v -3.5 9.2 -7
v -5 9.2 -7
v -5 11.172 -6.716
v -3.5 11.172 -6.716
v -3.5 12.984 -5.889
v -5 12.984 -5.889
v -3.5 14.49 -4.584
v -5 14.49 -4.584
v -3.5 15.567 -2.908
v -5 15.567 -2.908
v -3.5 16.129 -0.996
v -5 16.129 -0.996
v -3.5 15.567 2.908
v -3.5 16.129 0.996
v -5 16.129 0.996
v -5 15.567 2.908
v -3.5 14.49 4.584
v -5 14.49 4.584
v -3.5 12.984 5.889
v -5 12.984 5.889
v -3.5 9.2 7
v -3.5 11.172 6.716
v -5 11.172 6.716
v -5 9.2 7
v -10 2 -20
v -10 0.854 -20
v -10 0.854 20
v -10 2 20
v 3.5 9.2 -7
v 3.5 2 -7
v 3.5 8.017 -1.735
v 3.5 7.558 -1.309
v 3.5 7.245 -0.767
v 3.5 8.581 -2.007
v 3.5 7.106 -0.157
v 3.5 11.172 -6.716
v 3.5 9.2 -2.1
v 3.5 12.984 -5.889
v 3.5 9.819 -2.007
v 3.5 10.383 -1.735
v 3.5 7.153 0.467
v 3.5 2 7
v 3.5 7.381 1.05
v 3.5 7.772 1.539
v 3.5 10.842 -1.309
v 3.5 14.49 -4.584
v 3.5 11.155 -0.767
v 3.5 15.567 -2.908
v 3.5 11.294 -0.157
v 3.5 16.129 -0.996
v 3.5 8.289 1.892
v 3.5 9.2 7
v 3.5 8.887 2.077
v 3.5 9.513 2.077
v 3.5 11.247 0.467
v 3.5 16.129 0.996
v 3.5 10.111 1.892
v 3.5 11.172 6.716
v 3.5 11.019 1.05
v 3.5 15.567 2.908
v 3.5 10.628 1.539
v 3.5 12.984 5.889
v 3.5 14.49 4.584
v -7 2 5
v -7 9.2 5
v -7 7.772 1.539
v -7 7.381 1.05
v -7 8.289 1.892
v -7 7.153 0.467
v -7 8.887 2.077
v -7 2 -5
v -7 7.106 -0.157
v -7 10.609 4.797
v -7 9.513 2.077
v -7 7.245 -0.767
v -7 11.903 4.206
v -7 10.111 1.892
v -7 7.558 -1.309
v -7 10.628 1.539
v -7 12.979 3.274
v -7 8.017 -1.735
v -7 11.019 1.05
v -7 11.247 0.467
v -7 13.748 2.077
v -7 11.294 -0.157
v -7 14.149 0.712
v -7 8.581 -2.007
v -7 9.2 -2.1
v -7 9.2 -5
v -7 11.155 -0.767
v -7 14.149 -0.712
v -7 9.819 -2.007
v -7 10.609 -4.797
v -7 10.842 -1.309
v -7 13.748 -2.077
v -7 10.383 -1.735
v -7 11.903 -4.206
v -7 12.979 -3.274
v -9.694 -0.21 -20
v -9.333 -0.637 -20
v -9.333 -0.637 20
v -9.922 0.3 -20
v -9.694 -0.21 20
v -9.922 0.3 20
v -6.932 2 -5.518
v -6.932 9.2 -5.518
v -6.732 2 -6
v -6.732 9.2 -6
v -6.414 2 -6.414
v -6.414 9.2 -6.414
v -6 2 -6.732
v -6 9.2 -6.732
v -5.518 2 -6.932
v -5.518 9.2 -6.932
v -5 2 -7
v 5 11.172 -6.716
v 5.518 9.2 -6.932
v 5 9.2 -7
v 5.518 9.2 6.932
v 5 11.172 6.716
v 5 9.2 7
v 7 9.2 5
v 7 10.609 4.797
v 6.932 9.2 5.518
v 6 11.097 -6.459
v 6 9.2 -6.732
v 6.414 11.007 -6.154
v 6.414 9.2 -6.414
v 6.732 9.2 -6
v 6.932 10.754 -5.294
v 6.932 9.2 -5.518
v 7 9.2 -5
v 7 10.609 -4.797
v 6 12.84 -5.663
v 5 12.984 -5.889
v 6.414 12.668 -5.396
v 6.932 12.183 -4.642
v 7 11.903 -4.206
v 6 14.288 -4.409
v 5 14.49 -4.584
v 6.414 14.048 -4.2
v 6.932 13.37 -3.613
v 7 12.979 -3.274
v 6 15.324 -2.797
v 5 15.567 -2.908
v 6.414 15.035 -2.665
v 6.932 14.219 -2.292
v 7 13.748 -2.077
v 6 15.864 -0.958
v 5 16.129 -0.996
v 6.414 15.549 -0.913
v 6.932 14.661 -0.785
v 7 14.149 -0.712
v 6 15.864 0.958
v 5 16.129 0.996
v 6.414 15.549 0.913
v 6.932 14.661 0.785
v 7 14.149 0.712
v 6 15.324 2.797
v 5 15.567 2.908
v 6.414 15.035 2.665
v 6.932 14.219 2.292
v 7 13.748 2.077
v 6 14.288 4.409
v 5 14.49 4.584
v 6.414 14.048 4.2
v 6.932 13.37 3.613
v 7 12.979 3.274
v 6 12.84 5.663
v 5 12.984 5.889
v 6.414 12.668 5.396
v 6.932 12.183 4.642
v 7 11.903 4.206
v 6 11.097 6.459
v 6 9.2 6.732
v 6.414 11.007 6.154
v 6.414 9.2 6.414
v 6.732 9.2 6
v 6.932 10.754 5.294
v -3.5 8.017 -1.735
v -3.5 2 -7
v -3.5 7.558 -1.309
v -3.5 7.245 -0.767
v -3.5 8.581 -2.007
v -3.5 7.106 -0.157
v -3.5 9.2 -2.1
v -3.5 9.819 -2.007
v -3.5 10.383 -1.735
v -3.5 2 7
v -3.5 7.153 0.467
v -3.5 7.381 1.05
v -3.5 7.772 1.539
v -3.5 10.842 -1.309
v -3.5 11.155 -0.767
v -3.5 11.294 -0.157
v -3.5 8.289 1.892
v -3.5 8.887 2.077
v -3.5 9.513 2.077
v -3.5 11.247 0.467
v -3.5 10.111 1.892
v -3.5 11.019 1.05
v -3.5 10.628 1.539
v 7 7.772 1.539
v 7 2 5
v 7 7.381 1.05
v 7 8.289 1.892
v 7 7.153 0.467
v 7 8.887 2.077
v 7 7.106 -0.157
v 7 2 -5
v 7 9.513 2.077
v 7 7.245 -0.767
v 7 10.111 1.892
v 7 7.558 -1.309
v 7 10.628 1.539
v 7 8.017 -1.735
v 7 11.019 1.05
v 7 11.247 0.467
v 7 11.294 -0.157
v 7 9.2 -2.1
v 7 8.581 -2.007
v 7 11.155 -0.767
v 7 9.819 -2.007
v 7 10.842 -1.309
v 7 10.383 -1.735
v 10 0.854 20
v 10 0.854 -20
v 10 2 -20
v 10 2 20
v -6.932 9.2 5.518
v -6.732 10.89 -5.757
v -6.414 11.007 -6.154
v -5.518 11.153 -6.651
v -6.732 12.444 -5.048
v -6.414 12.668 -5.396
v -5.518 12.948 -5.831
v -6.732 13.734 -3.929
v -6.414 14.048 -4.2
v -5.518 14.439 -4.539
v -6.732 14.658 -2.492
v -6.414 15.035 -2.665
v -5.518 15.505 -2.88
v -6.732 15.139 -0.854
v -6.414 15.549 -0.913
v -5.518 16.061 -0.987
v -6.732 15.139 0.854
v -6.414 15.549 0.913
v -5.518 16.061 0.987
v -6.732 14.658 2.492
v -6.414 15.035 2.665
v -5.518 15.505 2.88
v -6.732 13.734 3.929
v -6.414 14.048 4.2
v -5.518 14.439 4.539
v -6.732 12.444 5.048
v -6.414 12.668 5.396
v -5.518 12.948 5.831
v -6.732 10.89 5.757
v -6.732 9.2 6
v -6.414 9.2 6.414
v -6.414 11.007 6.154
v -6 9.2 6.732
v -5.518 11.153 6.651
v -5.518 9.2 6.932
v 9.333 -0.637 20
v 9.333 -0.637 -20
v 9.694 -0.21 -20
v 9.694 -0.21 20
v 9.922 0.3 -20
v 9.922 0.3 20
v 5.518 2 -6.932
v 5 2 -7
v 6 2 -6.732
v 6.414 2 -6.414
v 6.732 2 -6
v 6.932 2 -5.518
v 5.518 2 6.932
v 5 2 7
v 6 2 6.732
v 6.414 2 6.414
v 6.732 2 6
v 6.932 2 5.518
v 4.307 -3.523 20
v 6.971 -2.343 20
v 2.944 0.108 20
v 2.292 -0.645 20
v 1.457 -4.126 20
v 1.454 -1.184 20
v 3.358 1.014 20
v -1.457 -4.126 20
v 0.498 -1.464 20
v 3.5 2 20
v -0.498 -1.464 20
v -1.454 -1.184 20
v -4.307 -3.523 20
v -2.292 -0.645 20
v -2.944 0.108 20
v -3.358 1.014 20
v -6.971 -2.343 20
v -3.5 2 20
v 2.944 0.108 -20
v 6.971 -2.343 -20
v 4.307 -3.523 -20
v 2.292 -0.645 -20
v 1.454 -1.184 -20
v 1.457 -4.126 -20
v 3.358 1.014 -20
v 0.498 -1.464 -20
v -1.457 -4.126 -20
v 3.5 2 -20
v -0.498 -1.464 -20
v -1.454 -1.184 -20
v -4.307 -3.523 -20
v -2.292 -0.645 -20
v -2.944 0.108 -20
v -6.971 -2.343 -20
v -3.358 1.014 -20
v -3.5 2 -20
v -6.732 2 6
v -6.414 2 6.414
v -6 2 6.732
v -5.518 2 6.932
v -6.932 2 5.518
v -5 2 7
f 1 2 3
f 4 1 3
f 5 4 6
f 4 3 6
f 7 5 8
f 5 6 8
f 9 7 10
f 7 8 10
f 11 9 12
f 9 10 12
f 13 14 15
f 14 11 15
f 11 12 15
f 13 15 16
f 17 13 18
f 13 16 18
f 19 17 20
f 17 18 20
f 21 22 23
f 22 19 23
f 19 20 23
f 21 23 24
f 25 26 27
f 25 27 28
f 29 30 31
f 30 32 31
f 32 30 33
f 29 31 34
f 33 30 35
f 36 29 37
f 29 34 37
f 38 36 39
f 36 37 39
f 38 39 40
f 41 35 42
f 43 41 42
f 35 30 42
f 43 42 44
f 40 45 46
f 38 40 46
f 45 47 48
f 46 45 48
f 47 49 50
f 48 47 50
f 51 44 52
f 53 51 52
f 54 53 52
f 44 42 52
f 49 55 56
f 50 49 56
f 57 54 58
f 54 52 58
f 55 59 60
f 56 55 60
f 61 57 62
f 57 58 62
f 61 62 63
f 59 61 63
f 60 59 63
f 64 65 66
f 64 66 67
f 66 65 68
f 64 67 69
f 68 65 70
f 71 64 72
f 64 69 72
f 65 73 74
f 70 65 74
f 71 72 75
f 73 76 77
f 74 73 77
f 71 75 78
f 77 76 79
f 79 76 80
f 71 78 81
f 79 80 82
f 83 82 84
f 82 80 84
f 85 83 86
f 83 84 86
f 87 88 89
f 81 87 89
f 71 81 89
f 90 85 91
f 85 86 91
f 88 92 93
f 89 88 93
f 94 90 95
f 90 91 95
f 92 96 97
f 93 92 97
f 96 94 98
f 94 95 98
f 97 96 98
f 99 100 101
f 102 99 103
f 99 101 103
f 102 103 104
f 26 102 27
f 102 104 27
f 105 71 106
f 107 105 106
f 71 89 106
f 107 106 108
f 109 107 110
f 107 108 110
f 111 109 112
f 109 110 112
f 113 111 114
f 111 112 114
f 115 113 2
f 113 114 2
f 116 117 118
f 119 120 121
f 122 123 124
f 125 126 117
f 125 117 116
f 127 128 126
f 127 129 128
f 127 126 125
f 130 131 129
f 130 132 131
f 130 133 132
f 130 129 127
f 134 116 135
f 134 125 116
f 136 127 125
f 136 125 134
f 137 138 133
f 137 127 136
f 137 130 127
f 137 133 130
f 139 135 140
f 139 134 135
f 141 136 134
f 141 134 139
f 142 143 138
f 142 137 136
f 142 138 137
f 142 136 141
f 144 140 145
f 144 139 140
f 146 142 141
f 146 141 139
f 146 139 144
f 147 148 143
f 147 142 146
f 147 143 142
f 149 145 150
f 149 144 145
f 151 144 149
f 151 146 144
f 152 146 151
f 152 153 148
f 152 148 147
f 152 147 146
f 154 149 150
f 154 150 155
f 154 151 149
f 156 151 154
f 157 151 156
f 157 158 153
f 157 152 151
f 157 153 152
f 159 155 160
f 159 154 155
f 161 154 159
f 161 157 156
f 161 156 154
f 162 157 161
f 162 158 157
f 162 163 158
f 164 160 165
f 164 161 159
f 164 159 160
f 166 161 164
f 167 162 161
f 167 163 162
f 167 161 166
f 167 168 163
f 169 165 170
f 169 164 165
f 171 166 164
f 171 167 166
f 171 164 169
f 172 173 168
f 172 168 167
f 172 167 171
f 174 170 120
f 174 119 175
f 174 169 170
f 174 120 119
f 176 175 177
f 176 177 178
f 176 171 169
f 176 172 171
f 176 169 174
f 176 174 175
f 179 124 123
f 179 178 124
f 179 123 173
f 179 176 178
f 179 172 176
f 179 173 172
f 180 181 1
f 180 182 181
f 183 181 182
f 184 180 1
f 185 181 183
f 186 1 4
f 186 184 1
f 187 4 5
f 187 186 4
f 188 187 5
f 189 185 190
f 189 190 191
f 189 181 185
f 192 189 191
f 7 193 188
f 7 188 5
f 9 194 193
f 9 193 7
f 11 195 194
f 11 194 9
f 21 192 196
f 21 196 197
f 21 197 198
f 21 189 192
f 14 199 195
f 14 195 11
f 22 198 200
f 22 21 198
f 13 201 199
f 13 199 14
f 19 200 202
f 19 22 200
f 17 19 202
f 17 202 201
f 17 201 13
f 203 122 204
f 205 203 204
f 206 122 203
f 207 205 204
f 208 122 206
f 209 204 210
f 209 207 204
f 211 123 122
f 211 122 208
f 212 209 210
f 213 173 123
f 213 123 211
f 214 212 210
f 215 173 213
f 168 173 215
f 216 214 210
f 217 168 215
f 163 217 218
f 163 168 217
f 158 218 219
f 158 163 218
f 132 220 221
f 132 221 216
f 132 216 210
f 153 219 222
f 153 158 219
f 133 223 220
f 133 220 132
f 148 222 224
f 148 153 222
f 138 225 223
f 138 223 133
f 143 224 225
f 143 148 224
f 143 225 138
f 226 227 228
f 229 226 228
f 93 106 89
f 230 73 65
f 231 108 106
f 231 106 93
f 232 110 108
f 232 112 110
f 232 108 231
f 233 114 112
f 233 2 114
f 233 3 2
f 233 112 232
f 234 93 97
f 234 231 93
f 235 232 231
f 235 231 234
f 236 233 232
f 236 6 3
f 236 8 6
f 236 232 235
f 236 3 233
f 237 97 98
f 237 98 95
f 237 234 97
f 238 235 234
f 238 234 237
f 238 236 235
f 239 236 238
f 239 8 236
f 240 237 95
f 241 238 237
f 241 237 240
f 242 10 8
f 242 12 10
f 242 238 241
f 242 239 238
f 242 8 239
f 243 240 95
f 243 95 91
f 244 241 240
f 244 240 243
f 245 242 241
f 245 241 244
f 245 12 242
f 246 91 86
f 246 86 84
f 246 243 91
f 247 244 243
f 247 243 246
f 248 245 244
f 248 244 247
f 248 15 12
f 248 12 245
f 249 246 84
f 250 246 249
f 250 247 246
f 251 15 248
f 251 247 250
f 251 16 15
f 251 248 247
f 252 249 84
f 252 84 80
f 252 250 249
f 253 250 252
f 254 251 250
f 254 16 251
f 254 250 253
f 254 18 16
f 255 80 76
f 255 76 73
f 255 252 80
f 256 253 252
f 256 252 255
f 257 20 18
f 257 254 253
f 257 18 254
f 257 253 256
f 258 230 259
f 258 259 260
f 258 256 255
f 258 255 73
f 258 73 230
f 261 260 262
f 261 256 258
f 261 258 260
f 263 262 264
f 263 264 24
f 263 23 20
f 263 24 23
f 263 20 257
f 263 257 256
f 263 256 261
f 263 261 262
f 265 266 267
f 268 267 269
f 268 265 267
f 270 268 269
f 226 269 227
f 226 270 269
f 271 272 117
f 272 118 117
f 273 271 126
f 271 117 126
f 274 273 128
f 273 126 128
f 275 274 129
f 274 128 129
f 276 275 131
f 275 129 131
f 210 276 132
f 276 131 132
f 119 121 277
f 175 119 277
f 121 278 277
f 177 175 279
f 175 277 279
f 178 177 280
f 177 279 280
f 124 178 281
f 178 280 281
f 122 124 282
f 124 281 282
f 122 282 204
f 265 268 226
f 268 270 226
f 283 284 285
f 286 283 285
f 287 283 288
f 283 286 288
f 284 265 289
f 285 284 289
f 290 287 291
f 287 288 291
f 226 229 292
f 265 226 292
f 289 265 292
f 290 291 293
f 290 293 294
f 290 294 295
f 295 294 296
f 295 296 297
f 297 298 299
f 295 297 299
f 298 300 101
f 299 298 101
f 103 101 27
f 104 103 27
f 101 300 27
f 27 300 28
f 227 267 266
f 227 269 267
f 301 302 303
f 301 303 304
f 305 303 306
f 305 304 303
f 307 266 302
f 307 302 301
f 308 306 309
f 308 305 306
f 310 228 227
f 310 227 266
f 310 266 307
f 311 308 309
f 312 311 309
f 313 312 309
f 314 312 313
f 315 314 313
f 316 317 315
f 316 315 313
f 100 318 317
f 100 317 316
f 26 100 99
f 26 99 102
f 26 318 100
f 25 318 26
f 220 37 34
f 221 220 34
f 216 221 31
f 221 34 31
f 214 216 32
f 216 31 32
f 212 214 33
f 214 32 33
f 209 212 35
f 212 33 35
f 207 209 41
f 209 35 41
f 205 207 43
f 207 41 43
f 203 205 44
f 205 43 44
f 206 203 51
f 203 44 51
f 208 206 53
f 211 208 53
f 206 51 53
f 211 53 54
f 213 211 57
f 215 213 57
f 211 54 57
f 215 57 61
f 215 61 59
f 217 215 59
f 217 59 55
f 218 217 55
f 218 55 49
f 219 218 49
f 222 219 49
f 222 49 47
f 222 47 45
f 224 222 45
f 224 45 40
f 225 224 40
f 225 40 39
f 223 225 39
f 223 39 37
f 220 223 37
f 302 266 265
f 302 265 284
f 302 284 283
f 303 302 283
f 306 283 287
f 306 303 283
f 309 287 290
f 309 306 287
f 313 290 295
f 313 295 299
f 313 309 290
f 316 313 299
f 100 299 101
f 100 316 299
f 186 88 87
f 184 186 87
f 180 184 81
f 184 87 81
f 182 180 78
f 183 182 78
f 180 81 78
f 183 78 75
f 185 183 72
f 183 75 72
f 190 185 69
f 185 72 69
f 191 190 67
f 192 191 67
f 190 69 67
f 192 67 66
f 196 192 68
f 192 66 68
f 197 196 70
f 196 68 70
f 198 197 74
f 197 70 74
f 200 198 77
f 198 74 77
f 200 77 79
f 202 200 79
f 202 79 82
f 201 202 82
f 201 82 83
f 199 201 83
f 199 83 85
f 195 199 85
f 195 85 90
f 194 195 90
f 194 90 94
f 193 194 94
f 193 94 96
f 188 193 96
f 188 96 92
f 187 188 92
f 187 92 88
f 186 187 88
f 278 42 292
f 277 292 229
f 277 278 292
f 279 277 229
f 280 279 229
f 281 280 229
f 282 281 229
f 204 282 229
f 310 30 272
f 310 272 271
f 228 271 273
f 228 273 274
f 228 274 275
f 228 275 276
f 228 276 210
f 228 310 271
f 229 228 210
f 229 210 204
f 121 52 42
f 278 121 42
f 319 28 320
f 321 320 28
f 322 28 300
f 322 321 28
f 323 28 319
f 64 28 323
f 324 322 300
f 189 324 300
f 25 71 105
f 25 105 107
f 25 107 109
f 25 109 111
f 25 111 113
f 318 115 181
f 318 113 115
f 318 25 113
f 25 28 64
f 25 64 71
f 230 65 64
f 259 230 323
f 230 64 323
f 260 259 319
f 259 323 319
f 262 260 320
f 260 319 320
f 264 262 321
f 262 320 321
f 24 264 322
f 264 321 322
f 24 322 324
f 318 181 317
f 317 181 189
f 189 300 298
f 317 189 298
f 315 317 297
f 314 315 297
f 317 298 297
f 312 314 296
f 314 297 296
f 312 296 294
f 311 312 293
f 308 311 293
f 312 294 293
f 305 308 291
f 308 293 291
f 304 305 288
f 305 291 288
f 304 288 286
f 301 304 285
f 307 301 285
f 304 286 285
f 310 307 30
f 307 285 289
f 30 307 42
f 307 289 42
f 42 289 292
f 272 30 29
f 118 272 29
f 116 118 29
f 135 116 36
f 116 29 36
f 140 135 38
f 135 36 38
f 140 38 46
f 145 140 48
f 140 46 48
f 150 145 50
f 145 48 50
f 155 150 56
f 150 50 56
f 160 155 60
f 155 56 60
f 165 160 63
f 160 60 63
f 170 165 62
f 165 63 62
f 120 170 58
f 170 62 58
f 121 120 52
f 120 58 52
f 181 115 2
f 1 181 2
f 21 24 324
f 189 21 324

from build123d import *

# Parameters (mm, degrees)
BOSS_EXTRUDE1_DEPTH      = 20
BOSS_EXTRUDE1_DEPTH_BACK = 20
BOSS_EXTRUDE2_DEPTH      = 7
BOSS_EXTRUDE2_DEPTH_BACK = 7
SKETCH2_R                = 2.1
SKETCH3_W                = 7
SKETCH3_H                = 15
CUT_EXTRUDE1_DEPTH       = 60
FILLET1_R                = 2
SKETCH4_R                = 3.5
CUT_EXTRUDE2_DEPTH       = 60
FILLET3_R                = 2


with BuildPart() as part:
    # Sketch1 → Boss-Extrude1 (new, two sides: drawn at the far end of the back side and taken through both)
    with BuildSketch(Plane.XY.offset(-BOSS_EXTRUDE1_DEPTH_BACK)):
        with BuildLine():
            Line((-10, 2), (-10, 0))
            ThreePointArc((-10, 0), (0, -4.202041029), (10, 0))
            Line((10, 0), (10, 2))
            Line((10, 2), (-10, 2))
        make_face()
    extrude(amount=BOSS_EXTRUDE1_DEPTH + BOSS_EXTRUDE1_DEPTH_BACK)

    # Sketch2 → Boss-Extrude2 (add, two sides: drawn at the far end of the back side and taken through both)
    with BuildSketch(Plane(origin=(0, 0, 0), x_dir=(0, 0, -1), z_dir=(1, 0, 0)).offset(-BOSS_EXTRUDE2_DEPTH_BACK)):
        with BuildLine():
            Line((-7, 9.2), (-7, 2))
            Line((-7, 2), (7, 2))
            Line((7, 2), (7, 9.2))
            ThreePointArc((7, 9.2), (0, 16.2), (-7, 9.2))
        make_face()
        with Locations((0, 9.2)):
            Circle(SKETCH2_R, mode=Mode.SUBTRACT)
    extrude(amount=BOSS_EXTRUDE2_DEPTH + BOSS_EXTRUDE2_DEPTH_BACK)

    # Sketch3 → Cut-Extrude1 (cut)
    with BuildSketch(Plane.XY.offset(7)):
        with Locations((0, 9.5)):
            Rectangle(SKETCH3_W, SKETCH3_H)
    extrude(amount=-CUT_EXTRUDE1_DEPTH, mode=Mode.SUBTRACT)

    # Fillet1
    fillet1_edges = [part.edges().sort_by_distance(p)[0] for p in [
        (-10, 0, 0),
        (10, 0, 0),
    ]]
    fillet(fillet1_edges, radius=FILLET1_R)

    # Sketch4 → Cut-Extrude2 (cut)
    with BuildSketch(Plane.XY.offset(20)):
        with Locations((0, 2)):
            Circle(SKETCH4_R)
    extrude(amount=-CUT_EXTRUDE2_DEPTH, mode=Mode.SUBTRACT)

    # Fillet3
    fillet3_edges = [part.edges().sort_by_distance(p)[0] for p in [
        (-7, 5.6, -7),
        (-7, 5.6, 7),
        (7, 5.6, -7),
        (7, 5.6, 7),
        (-7, 16.2, 0),
        (7, 16.2, 0),
    ]]
    fillet(fillet3_edges, radius=FILLET3_R)


solid = part.part
